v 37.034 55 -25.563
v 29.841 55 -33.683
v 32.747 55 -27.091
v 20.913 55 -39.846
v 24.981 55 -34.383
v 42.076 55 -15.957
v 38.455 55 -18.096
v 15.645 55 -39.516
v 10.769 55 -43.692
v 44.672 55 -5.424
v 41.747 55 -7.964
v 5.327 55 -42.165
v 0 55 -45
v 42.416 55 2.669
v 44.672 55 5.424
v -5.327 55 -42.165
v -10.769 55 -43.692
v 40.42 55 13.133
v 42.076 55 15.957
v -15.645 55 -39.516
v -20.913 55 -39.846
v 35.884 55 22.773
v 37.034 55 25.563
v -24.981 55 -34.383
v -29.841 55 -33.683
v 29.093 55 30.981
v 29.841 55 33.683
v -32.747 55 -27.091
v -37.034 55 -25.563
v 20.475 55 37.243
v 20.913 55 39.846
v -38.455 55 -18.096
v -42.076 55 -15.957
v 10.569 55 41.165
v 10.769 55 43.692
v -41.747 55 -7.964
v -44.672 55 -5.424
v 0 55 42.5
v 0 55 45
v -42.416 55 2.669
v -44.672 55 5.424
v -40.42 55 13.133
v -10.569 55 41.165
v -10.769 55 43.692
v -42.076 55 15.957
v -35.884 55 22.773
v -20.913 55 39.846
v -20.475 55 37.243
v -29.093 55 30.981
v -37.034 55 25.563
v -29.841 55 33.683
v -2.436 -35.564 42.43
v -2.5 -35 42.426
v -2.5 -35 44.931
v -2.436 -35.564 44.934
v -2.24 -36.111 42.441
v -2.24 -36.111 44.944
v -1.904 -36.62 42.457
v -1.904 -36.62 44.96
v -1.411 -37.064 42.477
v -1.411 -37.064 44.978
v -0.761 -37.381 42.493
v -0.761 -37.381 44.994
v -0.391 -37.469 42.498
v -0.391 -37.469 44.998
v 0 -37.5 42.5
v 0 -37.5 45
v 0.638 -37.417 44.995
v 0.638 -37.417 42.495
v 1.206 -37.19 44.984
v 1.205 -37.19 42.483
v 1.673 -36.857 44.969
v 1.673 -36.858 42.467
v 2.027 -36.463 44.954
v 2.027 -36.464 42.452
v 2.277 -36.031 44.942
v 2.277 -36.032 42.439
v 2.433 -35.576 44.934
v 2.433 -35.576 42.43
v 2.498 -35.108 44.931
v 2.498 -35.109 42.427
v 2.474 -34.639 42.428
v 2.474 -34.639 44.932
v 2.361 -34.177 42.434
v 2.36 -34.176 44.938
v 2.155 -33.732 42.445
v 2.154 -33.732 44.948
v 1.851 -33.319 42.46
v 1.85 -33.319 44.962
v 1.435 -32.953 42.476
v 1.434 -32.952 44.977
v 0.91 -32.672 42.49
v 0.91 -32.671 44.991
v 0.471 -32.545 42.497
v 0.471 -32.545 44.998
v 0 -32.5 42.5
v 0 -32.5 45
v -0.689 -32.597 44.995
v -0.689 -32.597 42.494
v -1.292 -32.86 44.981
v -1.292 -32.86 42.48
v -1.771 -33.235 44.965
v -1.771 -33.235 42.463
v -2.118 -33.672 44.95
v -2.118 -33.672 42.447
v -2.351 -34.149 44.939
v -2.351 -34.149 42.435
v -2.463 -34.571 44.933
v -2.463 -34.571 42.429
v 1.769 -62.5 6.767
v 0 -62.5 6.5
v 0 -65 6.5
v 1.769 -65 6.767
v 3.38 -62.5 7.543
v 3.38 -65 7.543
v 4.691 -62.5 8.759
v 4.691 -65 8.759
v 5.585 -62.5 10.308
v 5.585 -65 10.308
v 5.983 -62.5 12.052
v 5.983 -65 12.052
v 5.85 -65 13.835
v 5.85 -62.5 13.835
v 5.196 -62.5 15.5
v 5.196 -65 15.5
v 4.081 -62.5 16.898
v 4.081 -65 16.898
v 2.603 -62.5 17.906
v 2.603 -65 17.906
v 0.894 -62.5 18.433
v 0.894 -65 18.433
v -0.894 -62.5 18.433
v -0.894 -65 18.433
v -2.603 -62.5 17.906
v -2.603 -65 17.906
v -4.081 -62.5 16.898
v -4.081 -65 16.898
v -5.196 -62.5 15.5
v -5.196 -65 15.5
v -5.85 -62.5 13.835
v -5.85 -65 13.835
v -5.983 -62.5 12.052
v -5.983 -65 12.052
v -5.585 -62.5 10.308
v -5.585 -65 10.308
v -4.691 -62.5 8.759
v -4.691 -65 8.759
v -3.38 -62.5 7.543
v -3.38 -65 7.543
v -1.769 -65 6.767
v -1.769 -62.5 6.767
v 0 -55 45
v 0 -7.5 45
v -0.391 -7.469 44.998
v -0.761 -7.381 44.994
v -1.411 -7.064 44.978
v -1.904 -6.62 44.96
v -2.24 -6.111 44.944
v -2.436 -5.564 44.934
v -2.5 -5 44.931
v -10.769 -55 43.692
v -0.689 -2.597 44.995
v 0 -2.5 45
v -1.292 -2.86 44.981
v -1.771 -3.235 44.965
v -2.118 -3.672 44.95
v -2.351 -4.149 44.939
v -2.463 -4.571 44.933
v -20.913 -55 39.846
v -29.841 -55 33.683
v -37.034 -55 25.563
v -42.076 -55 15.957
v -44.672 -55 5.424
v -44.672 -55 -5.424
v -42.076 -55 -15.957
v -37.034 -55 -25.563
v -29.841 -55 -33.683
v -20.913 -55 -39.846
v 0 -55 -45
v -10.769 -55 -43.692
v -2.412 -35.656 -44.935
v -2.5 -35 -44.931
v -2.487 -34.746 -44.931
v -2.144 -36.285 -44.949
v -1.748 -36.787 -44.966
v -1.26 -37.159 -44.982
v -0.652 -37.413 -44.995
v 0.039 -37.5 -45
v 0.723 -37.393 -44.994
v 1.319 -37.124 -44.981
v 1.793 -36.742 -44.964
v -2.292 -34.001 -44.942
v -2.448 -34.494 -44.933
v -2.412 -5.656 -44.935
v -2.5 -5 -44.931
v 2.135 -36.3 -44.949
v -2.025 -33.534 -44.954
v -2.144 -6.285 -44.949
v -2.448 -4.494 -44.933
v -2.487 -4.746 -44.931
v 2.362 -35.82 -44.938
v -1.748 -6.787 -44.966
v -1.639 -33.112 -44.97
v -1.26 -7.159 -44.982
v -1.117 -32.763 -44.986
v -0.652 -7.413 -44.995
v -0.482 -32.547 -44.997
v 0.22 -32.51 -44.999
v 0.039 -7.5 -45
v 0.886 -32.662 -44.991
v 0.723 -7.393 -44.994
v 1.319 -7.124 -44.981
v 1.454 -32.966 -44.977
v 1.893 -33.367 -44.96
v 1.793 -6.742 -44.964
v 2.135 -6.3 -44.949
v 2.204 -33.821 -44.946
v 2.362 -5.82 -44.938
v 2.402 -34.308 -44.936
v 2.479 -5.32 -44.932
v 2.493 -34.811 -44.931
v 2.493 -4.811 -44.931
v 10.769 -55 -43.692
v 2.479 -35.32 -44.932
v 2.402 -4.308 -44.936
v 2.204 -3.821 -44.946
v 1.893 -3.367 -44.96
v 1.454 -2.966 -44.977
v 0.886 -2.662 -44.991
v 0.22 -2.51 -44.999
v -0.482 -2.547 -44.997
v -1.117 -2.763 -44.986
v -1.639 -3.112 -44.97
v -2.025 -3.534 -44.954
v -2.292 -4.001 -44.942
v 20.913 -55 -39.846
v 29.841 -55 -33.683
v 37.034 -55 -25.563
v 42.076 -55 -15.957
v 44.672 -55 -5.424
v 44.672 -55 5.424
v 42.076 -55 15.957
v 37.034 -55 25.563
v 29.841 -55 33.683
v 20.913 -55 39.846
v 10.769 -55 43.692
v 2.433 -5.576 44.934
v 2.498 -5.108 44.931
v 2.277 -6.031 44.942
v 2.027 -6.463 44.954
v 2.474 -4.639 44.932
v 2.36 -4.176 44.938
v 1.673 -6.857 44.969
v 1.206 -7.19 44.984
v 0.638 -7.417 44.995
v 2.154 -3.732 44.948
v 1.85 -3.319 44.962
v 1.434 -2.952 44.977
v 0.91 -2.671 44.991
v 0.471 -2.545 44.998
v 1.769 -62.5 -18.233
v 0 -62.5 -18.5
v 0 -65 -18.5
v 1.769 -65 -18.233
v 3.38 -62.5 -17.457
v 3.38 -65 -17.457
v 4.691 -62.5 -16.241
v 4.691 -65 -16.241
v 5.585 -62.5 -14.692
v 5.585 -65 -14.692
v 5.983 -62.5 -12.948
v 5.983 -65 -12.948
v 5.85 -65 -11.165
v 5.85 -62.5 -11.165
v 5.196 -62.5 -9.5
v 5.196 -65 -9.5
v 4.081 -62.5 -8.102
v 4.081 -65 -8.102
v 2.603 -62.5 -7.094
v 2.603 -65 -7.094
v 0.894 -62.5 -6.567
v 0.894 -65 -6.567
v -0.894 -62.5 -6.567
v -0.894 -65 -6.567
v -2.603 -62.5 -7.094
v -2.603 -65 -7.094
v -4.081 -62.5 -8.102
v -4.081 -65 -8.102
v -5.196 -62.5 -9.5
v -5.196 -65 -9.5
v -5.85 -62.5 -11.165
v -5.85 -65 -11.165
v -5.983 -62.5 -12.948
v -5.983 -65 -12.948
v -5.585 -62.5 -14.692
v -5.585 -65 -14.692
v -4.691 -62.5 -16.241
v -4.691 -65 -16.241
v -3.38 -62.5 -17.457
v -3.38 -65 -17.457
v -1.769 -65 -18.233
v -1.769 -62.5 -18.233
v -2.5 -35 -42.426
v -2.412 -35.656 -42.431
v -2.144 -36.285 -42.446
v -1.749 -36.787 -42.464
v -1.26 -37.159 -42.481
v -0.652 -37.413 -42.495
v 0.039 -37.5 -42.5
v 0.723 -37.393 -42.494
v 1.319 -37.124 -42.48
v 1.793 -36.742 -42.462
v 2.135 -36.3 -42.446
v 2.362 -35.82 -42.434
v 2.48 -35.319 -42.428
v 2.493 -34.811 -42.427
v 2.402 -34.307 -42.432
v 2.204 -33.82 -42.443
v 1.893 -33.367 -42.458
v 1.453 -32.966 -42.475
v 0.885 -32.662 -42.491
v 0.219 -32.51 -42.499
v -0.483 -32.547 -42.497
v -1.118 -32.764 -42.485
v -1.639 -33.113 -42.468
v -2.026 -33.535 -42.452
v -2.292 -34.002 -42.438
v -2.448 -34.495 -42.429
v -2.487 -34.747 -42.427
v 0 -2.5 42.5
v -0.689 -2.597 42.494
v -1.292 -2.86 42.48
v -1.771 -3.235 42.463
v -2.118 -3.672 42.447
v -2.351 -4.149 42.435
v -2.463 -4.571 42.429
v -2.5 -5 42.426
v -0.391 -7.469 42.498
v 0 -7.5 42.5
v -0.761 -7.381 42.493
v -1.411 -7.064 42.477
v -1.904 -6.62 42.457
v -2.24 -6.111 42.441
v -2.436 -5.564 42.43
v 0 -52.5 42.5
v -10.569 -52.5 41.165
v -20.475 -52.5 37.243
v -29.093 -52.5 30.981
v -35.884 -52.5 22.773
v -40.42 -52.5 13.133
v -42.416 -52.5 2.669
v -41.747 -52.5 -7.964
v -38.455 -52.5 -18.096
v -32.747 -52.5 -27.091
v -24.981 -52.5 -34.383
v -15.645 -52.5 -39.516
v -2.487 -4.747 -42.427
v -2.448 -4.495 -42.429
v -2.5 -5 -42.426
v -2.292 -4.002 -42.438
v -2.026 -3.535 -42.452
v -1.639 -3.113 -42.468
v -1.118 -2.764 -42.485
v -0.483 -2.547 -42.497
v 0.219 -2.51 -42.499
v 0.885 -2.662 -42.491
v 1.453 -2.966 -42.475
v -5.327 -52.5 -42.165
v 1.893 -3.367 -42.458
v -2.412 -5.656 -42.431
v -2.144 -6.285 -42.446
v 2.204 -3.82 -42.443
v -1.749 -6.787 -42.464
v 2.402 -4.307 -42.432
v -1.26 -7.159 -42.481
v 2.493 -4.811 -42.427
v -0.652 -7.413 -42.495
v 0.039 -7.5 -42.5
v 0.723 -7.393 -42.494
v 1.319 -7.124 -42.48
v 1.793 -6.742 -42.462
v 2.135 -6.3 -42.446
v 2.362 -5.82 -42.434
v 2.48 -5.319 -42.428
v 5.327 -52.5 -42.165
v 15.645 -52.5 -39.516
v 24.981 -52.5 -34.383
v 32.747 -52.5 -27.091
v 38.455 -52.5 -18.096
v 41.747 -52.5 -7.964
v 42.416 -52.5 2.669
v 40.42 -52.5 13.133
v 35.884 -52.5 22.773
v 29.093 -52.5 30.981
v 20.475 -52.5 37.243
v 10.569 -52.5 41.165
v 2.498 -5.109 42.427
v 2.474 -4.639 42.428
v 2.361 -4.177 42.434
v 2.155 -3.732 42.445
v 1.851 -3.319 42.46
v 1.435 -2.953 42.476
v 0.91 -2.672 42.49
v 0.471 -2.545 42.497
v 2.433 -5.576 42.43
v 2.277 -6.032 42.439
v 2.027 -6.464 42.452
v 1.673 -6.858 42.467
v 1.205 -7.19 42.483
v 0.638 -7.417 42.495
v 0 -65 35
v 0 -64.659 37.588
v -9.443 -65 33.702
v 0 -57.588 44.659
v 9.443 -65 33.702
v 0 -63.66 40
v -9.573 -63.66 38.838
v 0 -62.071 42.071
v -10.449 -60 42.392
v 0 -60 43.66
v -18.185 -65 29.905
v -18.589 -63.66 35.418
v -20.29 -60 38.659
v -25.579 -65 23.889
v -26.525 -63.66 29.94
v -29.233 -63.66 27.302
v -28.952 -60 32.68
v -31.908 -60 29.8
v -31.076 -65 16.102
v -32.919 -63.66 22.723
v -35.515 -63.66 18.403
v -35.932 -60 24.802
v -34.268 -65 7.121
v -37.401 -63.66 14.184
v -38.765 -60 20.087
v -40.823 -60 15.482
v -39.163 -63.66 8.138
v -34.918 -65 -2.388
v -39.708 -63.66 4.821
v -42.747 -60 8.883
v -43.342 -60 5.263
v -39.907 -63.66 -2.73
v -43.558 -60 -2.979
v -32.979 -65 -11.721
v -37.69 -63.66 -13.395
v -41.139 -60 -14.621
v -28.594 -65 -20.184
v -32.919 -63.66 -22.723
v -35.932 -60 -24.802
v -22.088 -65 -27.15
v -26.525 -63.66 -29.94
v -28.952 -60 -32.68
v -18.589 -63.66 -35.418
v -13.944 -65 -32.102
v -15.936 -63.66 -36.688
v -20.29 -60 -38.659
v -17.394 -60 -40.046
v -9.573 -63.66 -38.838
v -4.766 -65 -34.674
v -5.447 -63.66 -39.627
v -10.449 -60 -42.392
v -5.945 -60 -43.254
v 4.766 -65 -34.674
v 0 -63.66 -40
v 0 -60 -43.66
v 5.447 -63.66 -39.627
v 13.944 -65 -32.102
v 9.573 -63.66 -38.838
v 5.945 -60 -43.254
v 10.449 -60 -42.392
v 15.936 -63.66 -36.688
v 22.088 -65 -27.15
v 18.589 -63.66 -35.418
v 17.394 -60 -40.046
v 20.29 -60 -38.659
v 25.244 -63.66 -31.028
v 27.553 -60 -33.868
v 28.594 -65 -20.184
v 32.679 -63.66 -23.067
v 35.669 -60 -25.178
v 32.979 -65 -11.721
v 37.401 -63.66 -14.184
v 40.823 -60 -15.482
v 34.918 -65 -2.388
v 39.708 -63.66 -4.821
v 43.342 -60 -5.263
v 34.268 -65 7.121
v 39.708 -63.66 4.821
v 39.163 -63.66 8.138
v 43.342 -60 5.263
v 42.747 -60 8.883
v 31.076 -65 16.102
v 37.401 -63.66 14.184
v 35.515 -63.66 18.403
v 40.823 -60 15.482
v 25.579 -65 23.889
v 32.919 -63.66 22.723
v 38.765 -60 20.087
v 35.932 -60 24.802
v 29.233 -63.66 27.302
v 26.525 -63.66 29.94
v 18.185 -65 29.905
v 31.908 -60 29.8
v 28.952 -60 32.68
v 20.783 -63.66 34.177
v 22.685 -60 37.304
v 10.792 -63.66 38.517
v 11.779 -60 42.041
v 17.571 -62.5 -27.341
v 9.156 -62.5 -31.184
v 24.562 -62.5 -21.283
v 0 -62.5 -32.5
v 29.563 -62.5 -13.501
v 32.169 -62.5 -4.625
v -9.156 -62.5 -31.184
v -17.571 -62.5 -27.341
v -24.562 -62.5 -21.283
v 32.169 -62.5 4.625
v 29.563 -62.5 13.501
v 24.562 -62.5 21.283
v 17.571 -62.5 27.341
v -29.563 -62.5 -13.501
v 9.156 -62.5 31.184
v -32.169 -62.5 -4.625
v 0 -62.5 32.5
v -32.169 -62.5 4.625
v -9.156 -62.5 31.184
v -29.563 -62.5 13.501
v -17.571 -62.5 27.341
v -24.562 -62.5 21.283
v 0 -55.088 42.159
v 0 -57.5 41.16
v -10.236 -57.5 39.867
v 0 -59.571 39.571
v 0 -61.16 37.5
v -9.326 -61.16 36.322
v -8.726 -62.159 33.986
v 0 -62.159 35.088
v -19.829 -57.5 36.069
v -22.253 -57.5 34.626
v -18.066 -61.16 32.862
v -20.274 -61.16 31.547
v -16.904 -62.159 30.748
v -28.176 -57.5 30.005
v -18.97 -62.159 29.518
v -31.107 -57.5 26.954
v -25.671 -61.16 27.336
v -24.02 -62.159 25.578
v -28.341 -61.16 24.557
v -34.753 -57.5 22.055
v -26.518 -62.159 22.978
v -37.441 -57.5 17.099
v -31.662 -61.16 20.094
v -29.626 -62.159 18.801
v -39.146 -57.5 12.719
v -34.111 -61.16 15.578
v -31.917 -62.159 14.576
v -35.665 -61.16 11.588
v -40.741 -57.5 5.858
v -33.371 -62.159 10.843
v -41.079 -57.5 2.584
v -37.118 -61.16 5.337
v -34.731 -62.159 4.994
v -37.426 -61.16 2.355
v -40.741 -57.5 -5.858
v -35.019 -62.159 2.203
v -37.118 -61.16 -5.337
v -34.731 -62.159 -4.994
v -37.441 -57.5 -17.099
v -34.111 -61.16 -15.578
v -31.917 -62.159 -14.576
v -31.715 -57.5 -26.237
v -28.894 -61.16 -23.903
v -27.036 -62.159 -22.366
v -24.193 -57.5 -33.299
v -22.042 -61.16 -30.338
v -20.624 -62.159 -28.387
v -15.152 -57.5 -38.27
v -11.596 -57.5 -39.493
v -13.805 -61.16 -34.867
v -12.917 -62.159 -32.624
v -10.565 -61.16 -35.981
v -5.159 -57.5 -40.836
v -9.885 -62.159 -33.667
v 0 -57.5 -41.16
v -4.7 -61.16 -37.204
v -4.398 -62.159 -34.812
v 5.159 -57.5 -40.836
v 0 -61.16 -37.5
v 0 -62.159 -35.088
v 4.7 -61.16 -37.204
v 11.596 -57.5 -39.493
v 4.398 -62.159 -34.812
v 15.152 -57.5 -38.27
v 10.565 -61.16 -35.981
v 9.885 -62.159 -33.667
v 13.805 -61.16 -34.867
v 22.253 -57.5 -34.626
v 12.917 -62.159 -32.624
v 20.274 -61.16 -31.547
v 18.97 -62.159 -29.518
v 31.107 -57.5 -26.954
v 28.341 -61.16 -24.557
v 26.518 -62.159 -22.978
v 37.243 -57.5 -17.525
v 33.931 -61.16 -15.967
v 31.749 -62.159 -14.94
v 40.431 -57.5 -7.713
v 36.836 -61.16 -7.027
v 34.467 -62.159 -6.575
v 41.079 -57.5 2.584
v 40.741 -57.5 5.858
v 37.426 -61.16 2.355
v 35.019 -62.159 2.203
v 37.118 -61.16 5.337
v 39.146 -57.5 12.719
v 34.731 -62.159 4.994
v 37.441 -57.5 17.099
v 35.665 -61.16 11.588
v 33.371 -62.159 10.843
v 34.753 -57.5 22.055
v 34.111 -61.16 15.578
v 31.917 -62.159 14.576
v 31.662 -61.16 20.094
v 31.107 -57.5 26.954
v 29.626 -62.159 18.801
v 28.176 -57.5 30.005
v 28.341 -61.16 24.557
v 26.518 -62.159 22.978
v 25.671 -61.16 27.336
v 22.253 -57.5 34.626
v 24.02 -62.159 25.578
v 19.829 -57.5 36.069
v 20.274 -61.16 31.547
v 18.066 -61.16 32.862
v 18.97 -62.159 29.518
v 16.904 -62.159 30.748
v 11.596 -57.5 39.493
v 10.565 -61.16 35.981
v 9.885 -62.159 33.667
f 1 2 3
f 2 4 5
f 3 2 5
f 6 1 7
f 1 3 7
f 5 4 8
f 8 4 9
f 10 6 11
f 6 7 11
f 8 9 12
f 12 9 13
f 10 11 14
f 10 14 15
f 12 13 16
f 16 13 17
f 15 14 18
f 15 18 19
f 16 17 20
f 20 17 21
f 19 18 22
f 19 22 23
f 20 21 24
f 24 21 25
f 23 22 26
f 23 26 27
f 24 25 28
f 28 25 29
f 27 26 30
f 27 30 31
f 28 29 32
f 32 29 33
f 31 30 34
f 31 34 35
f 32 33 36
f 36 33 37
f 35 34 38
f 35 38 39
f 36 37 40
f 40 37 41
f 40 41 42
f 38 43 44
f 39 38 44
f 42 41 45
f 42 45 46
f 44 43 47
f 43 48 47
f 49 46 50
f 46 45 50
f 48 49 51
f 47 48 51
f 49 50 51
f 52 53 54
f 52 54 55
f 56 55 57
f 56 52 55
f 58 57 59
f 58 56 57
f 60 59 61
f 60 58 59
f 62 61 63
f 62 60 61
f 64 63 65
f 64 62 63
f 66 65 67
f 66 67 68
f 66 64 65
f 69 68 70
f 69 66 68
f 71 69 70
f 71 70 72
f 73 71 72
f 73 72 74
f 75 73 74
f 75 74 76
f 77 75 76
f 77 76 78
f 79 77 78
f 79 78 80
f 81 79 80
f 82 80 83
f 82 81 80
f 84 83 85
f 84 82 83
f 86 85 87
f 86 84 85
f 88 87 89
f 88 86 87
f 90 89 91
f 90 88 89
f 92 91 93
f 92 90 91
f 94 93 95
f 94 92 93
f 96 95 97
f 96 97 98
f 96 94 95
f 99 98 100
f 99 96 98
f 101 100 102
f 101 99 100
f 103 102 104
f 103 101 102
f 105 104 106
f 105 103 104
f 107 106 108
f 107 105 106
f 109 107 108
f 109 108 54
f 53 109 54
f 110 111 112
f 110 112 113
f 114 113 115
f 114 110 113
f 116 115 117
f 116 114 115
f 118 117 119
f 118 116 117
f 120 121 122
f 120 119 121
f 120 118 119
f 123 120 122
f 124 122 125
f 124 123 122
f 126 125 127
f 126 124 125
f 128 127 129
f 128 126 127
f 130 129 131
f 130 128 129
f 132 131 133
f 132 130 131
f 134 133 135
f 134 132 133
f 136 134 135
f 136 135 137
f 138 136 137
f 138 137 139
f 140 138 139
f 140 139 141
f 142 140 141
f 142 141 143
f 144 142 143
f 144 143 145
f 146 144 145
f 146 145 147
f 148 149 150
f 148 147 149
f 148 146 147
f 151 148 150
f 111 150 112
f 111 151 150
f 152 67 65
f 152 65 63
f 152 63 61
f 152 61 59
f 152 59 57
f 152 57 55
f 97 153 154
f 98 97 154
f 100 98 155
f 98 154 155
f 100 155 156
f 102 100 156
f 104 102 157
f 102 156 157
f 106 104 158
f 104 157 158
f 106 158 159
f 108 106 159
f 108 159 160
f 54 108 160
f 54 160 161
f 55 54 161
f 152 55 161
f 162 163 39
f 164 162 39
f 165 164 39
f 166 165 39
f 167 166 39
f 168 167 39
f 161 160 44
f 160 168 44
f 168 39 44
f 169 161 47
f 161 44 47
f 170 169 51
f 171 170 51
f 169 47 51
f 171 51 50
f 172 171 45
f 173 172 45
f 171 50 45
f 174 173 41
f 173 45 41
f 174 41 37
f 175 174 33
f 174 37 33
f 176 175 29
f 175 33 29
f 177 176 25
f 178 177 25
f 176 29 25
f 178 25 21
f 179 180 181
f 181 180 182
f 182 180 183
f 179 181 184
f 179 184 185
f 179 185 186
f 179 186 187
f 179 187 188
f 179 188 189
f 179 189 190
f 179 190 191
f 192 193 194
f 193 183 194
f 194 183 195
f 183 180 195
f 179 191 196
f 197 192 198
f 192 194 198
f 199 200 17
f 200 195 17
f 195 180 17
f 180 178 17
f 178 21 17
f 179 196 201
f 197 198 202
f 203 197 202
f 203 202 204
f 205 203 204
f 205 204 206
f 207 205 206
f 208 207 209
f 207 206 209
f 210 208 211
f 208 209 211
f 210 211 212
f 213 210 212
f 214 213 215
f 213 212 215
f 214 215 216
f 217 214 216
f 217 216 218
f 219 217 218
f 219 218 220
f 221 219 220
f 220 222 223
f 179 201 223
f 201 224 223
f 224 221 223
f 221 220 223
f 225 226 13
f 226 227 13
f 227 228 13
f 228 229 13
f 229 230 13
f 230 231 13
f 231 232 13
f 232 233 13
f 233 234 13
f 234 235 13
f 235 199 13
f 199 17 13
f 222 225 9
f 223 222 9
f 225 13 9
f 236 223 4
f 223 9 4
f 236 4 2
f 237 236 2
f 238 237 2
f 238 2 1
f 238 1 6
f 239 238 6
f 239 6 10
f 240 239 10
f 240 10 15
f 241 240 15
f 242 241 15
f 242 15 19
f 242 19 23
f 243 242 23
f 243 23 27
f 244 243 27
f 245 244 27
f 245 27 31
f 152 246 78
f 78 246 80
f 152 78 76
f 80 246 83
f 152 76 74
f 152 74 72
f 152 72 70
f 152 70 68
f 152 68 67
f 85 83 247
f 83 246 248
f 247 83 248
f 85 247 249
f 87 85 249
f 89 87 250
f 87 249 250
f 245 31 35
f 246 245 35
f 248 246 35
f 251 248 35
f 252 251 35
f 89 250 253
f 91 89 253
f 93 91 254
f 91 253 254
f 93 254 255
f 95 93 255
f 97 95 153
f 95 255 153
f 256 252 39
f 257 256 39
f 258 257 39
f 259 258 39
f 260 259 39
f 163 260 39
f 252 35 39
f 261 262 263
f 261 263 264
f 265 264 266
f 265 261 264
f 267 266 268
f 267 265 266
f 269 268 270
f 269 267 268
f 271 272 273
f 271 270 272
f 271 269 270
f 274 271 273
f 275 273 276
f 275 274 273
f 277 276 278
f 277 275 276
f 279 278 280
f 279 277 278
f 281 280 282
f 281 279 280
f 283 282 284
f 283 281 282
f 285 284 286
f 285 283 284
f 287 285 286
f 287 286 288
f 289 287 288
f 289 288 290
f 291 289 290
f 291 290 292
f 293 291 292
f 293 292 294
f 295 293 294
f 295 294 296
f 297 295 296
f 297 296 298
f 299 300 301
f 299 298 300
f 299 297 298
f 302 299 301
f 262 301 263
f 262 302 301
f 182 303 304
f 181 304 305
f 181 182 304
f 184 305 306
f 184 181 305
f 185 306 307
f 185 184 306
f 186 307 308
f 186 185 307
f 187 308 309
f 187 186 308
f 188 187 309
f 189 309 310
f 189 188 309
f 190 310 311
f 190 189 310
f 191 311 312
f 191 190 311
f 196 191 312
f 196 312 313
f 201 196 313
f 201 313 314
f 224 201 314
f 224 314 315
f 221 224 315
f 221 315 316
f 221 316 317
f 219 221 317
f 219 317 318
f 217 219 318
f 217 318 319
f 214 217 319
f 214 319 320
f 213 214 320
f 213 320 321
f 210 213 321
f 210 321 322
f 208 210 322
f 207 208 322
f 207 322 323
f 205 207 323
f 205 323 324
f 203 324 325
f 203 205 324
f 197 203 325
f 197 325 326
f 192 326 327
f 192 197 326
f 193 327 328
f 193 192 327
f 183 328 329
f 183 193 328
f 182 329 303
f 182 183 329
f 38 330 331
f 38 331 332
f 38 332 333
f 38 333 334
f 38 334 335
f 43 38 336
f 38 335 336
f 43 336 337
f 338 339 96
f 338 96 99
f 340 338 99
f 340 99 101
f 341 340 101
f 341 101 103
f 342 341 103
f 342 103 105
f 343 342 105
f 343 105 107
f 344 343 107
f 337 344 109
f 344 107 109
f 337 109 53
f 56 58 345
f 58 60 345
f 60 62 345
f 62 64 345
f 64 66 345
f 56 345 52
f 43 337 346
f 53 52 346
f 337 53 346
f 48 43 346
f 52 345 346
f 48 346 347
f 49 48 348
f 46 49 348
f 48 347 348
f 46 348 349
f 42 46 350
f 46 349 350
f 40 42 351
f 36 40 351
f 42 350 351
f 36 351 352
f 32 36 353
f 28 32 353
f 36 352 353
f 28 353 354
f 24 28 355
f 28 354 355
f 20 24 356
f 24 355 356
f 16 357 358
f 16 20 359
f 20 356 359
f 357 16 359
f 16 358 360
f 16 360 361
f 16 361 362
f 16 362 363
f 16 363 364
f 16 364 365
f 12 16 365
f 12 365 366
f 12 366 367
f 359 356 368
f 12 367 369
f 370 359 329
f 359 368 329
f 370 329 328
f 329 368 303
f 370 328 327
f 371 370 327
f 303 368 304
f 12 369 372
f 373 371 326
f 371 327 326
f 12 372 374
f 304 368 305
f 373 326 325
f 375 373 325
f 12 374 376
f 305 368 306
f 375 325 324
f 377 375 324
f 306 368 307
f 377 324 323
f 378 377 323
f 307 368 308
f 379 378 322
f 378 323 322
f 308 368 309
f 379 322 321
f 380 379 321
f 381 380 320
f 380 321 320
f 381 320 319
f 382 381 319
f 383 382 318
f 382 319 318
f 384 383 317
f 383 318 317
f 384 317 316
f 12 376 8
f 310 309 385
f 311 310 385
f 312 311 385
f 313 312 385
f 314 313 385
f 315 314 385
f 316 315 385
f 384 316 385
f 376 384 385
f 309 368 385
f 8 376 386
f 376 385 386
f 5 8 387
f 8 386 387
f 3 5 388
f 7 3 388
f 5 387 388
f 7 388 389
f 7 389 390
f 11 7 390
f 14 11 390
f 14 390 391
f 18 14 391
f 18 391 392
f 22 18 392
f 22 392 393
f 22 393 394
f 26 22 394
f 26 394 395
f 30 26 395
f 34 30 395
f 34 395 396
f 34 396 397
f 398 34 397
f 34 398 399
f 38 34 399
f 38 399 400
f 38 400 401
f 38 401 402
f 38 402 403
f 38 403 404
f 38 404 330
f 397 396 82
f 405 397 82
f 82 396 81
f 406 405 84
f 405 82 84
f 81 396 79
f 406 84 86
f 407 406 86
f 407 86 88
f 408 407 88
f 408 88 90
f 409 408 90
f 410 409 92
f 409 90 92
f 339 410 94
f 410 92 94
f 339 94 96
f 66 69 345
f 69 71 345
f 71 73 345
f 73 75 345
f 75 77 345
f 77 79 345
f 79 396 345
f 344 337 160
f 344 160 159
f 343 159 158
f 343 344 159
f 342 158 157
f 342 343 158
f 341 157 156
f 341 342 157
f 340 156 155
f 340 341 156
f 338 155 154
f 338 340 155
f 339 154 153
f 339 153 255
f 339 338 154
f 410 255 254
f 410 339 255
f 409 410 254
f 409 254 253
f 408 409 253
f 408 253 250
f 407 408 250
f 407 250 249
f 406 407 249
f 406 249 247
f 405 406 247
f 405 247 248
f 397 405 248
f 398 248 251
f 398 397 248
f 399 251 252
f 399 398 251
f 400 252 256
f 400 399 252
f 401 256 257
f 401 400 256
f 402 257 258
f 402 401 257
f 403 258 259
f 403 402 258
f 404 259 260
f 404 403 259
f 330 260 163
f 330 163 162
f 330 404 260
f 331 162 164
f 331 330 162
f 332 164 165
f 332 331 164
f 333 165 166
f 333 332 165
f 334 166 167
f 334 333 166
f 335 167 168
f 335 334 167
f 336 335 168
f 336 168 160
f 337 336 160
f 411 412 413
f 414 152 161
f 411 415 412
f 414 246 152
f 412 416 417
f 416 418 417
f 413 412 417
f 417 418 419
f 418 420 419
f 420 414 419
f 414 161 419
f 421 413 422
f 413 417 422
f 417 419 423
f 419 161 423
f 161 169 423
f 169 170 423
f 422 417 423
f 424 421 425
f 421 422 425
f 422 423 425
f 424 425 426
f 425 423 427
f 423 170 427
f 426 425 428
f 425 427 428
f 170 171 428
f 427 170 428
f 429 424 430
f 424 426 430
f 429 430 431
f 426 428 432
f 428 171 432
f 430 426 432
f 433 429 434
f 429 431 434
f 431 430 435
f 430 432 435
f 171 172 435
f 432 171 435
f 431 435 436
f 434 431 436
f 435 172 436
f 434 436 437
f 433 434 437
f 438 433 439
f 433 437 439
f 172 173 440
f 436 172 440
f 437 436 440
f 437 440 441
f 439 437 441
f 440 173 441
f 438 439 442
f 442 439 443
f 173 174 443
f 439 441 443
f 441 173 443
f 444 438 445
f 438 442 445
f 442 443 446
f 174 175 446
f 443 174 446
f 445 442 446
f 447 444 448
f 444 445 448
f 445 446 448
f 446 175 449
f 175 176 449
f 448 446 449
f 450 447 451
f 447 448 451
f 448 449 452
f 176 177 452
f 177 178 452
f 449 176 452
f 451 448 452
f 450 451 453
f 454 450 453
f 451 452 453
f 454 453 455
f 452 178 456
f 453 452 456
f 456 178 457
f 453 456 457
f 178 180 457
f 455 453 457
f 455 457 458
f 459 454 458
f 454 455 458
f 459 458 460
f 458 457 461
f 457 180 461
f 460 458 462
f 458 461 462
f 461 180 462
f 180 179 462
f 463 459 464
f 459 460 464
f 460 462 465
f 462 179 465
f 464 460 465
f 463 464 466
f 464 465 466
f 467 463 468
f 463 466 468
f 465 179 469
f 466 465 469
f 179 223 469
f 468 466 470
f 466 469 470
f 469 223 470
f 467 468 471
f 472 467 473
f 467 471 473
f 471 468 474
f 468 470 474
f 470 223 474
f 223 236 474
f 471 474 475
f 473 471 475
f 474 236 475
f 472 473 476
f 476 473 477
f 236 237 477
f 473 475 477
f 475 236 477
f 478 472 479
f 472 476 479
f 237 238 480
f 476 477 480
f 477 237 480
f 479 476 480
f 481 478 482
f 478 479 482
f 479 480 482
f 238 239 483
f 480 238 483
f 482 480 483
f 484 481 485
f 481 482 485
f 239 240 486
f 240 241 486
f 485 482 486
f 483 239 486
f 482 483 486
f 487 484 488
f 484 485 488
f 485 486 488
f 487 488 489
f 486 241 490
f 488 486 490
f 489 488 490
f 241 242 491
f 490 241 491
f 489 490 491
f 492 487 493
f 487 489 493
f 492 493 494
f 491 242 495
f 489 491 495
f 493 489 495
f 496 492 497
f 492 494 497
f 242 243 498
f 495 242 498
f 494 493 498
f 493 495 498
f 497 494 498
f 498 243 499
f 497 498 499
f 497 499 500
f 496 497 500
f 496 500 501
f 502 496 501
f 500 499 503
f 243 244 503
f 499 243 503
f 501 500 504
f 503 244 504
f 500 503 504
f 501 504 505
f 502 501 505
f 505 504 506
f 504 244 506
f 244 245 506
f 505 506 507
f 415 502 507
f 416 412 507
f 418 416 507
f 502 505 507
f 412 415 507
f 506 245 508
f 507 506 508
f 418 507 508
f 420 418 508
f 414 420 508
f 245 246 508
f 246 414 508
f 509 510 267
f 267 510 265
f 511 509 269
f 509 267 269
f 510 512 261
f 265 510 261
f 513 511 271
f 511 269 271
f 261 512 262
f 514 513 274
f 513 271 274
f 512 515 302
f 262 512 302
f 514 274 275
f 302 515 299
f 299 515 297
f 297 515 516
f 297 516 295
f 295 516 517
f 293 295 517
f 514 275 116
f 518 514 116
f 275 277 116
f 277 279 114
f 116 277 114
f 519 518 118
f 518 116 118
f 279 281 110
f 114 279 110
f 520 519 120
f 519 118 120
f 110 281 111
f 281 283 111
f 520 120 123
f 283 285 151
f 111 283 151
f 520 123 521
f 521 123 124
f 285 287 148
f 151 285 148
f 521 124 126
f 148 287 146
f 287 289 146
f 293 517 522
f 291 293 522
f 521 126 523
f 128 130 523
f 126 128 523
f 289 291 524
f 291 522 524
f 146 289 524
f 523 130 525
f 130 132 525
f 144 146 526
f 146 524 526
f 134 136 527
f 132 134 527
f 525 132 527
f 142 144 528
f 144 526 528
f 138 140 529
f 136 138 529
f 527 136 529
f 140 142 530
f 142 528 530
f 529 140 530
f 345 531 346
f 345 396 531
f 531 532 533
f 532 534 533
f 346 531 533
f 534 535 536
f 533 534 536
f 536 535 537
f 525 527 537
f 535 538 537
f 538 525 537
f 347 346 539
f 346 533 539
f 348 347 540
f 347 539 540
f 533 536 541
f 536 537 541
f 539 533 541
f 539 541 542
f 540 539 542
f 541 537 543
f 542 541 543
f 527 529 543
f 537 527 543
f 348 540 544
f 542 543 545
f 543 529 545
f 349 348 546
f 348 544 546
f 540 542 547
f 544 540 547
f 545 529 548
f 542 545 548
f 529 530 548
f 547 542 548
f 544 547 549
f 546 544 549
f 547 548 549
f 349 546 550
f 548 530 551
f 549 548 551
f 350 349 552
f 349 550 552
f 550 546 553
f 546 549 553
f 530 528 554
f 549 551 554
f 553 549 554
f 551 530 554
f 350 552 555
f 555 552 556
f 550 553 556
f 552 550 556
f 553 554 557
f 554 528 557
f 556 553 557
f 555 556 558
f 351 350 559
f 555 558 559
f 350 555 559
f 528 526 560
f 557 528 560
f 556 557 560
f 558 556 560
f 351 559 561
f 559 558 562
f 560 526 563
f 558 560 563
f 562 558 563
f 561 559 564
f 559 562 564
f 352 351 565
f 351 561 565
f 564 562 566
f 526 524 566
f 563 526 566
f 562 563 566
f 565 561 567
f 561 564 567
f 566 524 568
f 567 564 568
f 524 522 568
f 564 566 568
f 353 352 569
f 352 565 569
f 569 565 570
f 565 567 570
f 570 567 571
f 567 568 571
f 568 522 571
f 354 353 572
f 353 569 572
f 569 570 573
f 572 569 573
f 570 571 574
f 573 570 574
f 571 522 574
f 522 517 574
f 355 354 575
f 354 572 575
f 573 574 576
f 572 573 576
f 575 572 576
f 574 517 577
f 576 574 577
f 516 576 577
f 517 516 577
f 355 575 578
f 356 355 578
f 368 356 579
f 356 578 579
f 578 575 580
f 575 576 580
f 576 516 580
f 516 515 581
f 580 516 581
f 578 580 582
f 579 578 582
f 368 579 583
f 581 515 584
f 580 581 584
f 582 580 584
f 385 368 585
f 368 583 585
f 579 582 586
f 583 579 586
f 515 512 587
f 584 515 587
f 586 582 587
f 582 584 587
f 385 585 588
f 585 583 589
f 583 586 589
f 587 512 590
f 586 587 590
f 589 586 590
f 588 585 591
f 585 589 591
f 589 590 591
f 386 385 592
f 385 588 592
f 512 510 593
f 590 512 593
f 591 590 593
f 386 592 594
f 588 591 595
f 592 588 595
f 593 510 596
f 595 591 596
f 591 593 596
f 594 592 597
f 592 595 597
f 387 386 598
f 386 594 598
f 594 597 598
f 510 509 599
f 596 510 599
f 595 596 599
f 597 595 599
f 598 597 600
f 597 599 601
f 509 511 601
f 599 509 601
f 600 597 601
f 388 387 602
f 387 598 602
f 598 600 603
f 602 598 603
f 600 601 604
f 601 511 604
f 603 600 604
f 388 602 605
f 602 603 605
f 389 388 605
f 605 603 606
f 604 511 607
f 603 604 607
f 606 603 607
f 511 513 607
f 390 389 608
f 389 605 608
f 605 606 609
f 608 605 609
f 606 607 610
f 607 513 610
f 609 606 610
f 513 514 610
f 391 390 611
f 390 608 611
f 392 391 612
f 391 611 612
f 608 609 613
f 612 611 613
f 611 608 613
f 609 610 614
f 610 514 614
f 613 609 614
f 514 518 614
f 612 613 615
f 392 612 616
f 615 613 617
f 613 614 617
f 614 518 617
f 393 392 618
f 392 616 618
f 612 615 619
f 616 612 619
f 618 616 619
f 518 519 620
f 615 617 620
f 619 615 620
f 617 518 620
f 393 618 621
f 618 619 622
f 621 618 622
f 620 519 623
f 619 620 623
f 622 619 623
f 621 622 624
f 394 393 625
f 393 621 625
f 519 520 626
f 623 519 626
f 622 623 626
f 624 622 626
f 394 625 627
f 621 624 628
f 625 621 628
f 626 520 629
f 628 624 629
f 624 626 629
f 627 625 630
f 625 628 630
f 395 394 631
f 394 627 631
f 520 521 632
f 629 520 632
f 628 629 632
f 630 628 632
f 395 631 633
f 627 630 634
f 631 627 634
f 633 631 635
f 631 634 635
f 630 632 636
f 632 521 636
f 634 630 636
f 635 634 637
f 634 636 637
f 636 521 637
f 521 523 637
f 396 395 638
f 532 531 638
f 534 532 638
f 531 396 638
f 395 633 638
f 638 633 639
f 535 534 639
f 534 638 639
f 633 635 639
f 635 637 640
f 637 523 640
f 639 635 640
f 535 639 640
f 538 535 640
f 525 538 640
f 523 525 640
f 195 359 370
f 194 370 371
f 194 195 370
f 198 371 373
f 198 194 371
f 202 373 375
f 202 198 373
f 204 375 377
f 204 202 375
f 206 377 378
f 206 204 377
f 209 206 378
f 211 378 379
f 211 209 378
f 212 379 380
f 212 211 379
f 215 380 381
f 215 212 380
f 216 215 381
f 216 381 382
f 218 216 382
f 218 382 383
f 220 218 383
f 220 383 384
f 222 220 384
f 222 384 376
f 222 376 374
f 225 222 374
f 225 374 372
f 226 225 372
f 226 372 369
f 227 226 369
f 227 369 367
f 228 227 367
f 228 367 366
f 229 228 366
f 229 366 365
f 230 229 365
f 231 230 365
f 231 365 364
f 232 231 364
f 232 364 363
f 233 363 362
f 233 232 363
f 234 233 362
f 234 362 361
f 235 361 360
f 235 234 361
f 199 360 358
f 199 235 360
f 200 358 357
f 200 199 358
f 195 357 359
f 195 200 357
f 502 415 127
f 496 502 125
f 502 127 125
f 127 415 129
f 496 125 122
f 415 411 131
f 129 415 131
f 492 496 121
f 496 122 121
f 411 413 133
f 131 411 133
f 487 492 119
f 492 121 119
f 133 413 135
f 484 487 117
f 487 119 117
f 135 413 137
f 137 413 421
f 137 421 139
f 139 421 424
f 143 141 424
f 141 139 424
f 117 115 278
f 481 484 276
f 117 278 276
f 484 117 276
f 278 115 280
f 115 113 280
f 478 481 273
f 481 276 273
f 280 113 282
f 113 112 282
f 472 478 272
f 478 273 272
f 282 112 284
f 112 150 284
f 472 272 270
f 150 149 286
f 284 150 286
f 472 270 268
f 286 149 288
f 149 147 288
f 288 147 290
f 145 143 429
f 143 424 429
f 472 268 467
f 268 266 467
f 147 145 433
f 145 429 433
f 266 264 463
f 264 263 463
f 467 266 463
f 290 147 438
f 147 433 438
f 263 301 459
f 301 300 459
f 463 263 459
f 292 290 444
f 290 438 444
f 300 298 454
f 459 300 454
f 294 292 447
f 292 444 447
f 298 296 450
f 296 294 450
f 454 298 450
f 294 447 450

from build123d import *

# Parameters (mm, degrees)
CUT_EXTRUDE1_DEPTH      = 136.830777072
CUT_EXTRUDE1_DEPTH_BACK = 136.830777072
SKETCH2_R               = 6
CUT_EXTRUDE2_DEPTH      = 91.967026993
CUT_EXTRUDE2_DEPTH_BACK = 91.967026993
SKETCH4_R               = 2.5


with BuildPart() as part:
    # Sketch1 → Revolve1 (revolve)
    with BuildSketch(Plane(origin=(0, 0, 0), x_dir=(0, 0, -1), z_dir=(1, 0, 0))):
        with BuildLine():
            Line((-42.5, 55), (-42.5, -52.5))
            ThreePointArc((-42.5, -52.5), (-39.571067812, -59.571067812), (-32.5, -62.5))
            Line((-32.5, -62.5), (0, -62.5))
            Line((0, -62.5), (0, -65))
            Line((0, -65), (-35, -65))
            ThreePointArc((-35, -65), (-42.071067812, -62.071067812), (-45, -55))
            Line((-45, -55), (-45, 55))
            Line((-45, 55), (-42.5, 55))
        make_face()
    revolve(axis=Axis((0, 51.85854301, 0), (0, -1, 0)))

    # Sketch2 → Cut-Extrude1 (cut, two sides: drawn at the far end of the back side and taken through both)
    with BuildSketch(Plane.XZ.offset(65).offset(-CUT_EXTRUDE1_DEPTH_BACK)):
        with Locations(Location((0, 12.5, 0), (0, 0, 270))):
            Circle(SKETCH2_R)
        with Locations(Location((0, -12.5, 0), (0, 0, 270))):
            Circle(SKETCH2_R)
    extrude(amount=CUT_EXTRUDE1_DEPTH + CUT_EXTRUDE1_DEPTH_BACK, mode=Mode.SUBTRACT)

    # Sketch4 → Cut-Extrude2 (cut, two sides: drawn at the far end of the back side and taken through both)
    with BuildSketch(Plane.XY.offset(-CUT_EXTRUDE2_DEPTH_BACK)):
        with Locations(Location((0, -5, 0), (0, 0, 180))):
            Circle(SKETCH4_R)
        with Locations(Location((0, -35, 0), (0, 0, 180))):
            Circle(SKETCH4_R)
    extrude(amount=CUT_EXTRUDE2_DEPTH + CUT_EXTRUDE2_DEPTH_BACK, mode=Mode.SUBTRACT)


solid = part.part
